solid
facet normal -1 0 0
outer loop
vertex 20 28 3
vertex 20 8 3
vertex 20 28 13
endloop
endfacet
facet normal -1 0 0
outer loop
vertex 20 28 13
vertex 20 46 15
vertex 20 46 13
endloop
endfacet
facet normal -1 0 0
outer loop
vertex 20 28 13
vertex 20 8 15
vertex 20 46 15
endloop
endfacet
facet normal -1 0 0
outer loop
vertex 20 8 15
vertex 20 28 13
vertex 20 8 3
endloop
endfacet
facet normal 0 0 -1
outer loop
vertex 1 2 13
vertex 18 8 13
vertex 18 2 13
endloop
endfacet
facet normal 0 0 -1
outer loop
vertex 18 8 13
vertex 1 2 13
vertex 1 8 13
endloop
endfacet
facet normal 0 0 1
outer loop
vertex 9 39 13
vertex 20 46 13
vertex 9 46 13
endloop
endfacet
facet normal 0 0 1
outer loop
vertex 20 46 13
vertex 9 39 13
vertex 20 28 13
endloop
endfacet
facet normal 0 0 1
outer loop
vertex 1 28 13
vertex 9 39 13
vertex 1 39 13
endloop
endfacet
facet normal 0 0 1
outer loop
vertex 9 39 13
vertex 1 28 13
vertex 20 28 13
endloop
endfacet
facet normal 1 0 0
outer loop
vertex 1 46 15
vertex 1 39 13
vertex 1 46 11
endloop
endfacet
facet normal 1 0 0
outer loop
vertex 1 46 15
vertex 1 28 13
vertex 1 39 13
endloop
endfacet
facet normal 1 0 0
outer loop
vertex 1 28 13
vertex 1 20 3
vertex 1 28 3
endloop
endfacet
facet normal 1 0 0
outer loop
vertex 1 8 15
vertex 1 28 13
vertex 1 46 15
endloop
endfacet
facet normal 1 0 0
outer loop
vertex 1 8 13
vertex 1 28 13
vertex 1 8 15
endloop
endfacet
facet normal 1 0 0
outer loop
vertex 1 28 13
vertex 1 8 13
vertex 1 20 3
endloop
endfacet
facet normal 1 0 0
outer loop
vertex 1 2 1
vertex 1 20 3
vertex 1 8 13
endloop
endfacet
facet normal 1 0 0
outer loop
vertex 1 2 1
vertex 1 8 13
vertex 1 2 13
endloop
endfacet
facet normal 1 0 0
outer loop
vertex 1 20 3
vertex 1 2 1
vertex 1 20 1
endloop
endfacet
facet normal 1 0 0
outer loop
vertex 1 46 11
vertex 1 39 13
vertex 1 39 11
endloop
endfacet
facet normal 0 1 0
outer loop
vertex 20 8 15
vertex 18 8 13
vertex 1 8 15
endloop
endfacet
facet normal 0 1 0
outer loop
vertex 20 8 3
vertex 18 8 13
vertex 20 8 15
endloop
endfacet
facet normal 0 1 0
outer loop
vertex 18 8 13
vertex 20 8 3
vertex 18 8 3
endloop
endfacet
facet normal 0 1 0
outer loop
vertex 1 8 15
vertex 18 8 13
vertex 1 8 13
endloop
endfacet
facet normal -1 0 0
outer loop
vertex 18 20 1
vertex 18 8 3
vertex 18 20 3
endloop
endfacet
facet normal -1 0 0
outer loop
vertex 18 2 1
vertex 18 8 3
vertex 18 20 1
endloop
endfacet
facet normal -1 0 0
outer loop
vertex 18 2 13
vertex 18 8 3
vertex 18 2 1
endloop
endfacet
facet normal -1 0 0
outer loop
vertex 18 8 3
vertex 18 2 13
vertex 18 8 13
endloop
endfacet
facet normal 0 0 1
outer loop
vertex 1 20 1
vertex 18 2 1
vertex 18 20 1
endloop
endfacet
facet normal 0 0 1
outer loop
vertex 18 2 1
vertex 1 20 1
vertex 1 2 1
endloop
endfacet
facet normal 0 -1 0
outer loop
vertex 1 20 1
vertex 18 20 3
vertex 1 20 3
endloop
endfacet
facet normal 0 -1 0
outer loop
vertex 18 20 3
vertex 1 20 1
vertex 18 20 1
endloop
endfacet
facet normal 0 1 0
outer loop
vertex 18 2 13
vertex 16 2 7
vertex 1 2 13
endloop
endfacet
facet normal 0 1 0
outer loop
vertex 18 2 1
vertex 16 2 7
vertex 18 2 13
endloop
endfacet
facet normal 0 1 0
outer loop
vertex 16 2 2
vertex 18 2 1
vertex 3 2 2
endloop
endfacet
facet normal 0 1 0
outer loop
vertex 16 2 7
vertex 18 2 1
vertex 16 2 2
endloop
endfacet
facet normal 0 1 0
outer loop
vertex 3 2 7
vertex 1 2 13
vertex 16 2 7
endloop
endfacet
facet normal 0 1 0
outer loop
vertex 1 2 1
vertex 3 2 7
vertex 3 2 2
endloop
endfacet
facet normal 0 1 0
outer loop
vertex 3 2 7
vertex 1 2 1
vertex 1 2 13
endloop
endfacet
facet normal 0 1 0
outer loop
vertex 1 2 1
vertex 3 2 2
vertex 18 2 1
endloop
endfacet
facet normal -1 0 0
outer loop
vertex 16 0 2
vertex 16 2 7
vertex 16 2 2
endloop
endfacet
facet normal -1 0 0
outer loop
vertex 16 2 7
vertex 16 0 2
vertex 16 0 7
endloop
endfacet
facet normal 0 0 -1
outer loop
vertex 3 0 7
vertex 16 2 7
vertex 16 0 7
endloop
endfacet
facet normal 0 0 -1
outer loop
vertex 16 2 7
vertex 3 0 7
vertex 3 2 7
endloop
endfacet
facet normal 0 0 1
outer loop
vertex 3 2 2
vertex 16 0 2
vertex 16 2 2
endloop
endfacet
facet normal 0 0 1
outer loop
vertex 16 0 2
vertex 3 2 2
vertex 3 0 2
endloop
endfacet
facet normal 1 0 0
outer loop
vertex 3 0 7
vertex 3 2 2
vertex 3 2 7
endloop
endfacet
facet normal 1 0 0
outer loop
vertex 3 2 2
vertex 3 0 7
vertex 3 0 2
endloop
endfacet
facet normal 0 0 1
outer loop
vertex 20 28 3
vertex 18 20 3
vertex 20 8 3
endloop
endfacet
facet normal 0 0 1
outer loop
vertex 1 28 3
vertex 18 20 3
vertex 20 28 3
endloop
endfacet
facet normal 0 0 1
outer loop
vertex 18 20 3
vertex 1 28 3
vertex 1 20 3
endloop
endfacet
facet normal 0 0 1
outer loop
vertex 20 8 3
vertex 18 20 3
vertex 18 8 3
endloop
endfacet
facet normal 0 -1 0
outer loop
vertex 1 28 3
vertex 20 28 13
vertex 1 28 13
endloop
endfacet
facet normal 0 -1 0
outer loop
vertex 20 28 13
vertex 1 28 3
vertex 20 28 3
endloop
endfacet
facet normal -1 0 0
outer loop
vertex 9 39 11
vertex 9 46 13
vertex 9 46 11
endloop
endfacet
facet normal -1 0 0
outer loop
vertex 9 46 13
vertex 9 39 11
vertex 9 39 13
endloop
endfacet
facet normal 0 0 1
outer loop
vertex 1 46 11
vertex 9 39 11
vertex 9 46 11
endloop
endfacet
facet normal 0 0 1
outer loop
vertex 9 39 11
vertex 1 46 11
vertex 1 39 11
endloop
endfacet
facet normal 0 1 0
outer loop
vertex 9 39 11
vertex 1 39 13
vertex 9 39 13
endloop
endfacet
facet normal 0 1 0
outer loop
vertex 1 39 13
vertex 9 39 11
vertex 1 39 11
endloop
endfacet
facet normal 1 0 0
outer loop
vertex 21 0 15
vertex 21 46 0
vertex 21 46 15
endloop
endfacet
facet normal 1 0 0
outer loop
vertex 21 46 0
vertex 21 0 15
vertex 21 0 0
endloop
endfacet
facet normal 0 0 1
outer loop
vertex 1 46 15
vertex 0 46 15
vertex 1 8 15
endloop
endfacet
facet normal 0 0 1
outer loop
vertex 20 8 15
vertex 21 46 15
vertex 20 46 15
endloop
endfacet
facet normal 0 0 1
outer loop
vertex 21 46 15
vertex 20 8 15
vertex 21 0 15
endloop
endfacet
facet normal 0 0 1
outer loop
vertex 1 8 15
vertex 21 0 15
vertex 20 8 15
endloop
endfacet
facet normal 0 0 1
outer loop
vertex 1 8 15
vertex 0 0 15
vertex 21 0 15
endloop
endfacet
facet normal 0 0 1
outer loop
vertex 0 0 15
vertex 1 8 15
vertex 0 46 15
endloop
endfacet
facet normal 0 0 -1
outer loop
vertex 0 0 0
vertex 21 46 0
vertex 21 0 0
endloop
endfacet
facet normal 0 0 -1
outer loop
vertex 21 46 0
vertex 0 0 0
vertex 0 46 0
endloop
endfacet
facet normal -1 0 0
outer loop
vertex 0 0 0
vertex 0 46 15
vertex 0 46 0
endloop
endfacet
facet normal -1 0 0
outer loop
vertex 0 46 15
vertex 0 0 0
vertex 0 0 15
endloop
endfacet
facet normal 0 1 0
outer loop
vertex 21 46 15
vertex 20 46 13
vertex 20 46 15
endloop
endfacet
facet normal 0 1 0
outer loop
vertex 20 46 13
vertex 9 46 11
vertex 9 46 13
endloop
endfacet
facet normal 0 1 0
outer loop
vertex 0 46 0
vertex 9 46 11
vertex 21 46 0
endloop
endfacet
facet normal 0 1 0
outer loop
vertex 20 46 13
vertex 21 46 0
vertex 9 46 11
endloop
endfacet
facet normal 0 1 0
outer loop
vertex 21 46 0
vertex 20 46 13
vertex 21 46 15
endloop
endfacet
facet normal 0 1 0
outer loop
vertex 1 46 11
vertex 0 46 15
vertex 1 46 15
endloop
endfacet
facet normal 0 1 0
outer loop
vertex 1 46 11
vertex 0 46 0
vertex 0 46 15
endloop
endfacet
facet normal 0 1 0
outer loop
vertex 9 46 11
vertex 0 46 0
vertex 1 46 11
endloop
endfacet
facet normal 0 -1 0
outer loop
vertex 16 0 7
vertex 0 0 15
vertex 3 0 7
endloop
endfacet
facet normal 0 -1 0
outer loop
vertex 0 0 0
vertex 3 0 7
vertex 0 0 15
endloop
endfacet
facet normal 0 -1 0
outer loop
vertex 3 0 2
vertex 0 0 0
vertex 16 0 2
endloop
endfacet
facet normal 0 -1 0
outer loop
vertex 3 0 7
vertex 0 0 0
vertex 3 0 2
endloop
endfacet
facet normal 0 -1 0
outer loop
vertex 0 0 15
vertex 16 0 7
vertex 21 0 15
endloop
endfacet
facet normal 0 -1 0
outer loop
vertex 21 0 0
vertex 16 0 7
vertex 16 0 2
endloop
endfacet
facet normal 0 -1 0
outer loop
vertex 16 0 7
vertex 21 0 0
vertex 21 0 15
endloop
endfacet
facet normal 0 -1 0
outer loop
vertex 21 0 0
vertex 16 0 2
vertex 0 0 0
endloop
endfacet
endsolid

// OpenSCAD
difference() {
	union() {
		cube(size = [21,46,15]);
	}

	union() {
		translate(v = [1,8,13])cube(size = [19,40,5]);
		translate(v = [1,3,1])cube(size = [17,17,2]);
		translate(v = [1,2,1])cube(size = [17,18,12]);
		translate(v = [3,-6,2])cube(size = [13,18,5]);
		translate(v = [1,8,3])cube(size = [19,20,12]);
		translate(v = [1,39,11])cube(size = [8,8,3]);
	}
}
